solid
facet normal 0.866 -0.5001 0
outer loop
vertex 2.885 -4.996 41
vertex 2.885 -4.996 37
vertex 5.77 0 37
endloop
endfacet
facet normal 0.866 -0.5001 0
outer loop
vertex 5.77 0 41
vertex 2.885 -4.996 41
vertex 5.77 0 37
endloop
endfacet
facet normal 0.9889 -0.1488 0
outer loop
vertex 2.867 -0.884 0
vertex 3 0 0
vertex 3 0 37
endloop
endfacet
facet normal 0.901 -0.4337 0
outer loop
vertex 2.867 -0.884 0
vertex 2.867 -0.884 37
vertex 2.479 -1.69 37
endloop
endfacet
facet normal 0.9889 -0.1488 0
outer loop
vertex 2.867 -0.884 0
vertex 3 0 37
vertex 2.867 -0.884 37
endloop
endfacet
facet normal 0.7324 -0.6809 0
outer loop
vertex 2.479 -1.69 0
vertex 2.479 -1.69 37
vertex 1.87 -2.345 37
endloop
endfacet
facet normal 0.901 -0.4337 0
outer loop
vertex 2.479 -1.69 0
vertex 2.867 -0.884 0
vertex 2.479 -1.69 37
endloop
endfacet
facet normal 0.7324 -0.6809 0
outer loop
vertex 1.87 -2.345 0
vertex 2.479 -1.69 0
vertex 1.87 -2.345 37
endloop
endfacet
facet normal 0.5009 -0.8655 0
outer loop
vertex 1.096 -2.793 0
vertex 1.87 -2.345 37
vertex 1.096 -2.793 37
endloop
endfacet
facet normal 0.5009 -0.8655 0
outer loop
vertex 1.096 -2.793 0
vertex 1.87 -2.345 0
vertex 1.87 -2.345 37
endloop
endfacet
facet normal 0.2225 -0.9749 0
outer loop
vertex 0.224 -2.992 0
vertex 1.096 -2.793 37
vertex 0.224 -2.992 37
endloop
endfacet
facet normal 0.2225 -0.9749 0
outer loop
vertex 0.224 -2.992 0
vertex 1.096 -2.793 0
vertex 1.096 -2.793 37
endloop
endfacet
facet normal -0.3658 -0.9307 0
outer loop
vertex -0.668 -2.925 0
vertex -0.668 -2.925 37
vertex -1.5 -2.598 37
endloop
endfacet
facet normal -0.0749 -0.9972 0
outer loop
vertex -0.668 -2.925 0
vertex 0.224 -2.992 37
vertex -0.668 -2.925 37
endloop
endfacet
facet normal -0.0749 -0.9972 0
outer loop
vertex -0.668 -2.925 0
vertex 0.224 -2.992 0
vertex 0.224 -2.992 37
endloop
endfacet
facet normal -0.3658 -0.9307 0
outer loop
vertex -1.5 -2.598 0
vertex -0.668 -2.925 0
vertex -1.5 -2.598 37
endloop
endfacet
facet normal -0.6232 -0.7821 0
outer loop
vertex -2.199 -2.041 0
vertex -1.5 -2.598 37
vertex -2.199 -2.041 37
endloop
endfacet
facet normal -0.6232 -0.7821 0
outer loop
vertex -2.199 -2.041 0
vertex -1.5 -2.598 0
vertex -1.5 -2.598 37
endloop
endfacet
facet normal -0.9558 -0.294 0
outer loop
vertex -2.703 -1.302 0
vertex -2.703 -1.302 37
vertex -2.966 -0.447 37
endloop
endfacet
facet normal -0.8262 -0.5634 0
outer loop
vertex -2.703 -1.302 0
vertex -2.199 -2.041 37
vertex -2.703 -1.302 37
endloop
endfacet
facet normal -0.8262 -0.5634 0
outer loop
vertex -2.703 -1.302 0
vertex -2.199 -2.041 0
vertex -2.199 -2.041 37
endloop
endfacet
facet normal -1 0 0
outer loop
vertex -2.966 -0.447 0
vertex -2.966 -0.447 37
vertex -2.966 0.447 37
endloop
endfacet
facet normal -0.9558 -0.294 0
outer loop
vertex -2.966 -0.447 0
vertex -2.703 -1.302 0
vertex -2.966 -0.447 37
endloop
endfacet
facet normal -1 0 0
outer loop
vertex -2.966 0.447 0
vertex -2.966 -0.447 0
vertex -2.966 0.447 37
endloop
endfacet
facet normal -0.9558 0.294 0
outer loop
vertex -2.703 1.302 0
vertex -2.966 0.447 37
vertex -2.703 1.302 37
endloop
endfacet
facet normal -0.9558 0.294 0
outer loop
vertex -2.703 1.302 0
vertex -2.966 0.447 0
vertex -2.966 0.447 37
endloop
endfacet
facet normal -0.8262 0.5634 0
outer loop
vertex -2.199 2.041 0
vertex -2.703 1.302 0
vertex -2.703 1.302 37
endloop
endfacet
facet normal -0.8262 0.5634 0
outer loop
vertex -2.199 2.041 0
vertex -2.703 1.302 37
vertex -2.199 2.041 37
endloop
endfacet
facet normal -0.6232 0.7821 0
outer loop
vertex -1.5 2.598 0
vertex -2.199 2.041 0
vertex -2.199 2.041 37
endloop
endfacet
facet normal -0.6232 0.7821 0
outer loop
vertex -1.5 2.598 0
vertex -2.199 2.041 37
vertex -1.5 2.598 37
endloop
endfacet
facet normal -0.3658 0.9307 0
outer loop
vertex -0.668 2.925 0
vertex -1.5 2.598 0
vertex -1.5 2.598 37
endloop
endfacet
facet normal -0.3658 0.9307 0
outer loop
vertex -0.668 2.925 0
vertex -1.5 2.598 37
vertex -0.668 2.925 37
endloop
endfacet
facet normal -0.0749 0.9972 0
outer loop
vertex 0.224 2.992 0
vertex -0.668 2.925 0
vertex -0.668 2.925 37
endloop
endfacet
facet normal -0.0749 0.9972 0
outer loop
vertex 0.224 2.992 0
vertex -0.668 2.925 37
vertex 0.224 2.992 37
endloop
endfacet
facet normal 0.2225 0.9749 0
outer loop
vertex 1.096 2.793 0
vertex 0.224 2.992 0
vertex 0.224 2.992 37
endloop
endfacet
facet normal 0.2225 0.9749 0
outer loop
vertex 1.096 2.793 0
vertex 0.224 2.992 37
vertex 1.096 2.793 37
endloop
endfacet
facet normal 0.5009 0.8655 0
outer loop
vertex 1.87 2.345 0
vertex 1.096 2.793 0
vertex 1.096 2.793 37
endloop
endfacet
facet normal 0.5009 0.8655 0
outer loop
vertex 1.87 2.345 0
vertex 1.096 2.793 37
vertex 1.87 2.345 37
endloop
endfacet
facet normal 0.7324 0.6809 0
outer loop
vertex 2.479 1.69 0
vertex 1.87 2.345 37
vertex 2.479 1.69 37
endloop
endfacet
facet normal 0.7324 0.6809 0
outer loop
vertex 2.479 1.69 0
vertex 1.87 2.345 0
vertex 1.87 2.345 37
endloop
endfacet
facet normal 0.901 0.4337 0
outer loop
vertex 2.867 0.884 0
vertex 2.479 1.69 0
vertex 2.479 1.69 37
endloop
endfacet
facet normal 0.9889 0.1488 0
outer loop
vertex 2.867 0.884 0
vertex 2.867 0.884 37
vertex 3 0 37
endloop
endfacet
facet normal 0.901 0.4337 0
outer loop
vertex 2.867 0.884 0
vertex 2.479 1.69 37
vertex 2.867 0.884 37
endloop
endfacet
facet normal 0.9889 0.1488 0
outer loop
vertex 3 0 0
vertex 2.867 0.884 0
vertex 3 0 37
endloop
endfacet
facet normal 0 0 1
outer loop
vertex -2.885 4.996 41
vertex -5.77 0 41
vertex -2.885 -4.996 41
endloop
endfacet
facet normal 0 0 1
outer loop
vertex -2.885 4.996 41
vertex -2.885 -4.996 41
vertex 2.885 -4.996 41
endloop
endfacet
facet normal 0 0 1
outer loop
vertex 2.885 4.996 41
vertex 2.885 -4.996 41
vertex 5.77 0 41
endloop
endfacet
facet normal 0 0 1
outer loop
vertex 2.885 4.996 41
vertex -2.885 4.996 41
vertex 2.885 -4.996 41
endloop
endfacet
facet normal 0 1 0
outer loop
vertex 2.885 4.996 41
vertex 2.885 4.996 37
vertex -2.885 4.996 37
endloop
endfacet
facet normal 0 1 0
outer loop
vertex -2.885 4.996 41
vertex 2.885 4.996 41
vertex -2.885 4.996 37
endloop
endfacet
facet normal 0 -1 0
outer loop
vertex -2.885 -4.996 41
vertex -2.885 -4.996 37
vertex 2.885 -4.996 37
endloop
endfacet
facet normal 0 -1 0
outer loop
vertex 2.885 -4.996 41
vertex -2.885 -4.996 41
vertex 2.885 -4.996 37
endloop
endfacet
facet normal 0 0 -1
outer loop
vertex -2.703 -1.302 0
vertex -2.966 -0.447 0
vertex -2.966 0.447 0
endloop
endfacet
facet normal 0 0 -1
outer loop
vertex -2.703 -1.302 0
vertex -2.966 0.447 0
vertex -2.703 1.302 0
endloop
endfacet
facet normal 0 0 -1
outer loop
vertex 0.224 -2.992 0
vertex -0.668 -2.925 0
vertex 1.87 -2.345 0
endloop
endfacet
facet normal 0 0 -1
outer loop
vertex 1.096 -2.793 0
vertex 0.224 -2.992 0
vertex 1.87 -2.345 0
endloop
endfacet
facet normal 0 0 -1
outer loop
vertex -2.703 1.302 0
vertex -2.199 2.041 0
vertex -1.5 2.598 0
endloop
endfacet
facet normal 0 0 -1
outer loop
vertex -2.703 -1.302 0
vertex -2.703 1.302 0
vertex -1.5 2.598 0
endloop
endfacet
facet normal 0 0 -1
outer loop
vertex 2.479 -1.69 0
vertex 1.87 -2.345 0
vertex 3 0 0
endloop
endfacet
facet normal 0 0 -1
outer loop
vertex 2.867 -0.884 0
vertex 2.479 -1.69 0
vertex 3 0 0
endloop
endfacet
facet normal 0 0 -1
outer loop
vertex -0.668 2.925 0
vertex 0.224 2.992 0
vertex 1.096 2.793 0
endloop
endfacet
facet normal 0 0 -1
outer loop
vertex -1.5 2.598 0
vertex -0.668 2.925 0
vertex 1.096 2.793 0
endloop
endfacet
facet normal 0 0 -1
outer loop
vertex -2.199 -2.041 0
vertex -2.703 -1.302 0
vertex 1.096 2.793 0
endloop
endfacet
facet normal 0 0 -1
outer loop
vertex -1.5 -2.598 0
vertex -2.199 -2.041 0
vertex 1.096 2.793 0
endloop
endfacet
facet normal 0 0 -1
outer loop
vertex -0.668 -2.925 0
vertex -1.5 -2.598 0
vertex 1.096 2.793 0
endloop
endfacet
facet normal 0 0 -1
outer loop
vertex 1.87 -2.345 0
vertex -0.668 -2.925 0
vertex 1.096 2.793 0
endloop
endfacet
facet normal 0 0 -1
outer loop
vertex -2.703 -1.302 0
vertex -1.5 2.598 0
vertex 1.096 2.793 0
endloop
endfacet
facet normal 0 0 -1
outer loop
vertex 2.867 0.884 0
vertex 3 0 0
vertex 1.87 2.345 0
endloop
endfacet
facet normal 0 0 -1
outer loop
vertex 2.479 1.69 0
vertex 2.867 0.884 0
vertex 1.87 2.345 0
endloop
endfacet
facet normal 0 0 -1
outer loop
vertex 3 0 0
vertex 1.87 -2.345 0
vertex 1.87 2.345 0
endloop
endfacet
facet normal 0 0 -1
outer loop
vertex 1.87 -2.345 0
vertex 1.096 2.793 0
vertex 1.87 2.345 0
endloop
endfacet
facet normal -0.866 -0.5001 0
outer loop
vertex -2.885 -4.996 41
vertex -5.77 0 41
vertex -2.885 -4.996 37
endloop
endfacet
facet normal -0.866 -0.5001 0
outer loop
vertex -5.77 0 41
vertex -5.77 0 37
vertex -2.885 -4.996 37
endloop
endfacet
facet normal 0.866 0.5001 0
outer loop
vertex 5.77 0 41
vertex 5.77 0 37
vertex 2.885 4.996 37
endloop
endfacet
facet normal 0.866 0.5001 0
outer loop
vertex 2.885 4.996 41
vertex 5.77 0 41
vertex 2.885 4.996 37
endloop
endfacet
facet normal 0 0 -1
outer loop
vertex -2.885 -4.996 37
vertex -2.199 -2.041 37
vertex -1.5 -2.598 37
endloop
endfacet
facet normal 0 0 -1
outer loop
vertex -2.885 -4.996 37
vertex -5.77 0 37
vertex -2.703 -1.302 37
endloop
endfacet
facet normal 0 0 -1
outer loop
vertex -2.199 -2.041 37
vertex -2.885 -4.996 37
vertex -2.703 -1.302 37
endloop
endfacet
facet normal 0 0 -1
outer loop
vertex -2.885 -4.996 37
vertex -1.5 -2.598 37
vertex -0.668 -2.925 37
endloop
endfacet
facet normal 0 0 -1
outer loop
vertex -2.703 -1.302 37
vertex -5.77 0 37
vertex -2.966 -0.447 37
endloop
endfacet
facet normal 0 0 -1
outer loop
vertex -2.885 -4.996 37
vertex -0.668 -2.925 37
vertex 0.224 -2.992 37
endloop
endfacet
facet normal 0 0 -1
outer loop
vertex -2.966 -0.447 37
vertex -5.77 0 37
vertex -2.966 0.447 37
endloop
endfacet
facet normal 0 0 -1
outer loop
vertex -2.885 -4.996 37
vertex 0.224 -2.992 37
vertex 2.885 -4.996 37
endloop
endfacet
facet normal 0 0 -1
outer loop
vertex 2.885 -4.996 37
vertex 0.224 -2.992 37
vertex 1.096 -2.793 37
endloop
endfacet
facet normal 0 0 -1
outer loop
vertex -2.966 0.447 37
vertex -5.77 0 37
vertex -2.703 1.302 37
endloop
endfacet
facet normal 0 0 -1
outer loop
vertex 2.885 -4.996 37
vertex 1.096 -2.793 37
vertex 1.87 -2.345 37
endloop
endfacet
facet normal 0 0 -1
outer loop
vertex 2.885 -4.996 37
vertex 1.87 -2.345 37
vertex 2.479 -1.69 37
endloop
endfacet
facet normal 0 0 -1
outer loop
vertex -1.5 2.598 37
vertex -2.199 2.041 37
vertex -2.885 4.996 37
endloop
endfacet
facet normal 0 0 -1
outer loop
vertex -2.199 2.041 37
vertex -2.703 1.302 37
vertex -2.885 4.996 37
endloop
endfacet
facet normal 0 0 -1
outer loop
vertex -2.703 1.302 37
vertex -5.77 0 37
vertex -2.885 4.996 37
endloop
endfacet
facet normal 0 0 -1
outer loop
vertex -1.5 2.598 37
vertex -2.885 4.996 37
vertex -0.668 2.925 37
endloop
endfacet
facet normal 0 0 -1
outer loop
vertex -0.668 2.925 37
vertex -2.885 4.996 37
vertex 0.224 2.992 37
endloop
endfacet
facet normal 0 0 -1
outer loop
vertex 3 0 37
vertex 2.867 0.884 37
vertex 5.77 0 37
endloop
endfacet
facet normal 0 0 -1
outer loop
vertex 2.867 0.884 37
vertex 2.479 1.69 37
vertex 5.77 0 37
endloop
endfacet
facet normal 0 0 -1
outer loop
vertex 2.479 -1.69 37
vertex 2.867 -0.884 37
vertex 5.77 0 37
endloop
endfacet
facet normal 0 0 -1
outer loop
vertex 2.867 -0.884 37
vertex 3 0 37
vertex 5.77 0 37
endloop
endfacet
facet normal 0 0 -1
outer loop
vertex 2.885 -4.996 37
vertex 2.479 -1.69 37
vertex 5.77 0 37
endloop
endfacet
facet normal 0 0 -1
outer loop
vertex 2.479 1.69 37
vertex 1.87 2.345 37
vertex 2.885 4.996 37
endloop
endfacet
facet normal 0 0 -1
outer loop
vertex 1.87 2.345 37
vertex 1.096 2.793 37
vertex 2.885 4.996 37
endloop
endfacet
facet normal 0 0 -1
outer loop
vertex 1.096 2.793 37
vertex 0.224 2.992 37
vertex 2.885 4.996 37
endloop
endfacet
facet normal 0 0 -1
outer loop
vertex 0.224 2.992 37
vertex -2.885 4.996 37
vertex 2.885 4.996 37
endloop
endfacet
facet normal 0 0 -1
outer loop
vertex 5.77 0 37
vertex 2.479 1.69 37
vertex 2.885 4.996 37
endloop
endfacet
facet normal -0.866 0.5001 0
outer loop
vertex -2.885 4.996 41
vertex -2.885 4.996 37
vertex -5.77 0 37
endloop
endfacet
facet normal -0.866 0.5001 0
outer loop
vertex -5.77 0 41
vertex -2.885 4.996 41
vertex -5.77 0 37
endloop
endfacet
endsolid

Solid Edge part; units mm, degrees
sketch "Sketch1" plane through (0, 0, 0) normal (0, 0, 1) x (1, 0, 0)
  circle A0 centre (0, 0) radius 3
extrude "Protrusion1" add sketch "Sketch1" along normal blind 37
sketch "Sketch2" plane through (0, 0, 37) normal (0, 0, 1) x (1, 0, 0)
  line L0 (-2.8847, 4.9965) -> (-5.7695, 0)
  line L1 (-5.7695, 0) -> (-2.8847, -4.9965)
  line L2 (-2.8847, -4.9965) -> (2.8847, -4.9965)
  line L3 (2.8847, -4.9965) -> (5.7695, 0)
  line L4 (5.7695, 0) -> (2.8847, 4.9965)
  line L5 (2.8847, 4.9965) -> (-2.8847, 4.9965)
extrude "ExtrudedProtrusion_2" add sketch "Sketch2" along normal blind 4
cosmetic_thread "Thread_1" size "M6" thread depth 10
properties material "Steel"
